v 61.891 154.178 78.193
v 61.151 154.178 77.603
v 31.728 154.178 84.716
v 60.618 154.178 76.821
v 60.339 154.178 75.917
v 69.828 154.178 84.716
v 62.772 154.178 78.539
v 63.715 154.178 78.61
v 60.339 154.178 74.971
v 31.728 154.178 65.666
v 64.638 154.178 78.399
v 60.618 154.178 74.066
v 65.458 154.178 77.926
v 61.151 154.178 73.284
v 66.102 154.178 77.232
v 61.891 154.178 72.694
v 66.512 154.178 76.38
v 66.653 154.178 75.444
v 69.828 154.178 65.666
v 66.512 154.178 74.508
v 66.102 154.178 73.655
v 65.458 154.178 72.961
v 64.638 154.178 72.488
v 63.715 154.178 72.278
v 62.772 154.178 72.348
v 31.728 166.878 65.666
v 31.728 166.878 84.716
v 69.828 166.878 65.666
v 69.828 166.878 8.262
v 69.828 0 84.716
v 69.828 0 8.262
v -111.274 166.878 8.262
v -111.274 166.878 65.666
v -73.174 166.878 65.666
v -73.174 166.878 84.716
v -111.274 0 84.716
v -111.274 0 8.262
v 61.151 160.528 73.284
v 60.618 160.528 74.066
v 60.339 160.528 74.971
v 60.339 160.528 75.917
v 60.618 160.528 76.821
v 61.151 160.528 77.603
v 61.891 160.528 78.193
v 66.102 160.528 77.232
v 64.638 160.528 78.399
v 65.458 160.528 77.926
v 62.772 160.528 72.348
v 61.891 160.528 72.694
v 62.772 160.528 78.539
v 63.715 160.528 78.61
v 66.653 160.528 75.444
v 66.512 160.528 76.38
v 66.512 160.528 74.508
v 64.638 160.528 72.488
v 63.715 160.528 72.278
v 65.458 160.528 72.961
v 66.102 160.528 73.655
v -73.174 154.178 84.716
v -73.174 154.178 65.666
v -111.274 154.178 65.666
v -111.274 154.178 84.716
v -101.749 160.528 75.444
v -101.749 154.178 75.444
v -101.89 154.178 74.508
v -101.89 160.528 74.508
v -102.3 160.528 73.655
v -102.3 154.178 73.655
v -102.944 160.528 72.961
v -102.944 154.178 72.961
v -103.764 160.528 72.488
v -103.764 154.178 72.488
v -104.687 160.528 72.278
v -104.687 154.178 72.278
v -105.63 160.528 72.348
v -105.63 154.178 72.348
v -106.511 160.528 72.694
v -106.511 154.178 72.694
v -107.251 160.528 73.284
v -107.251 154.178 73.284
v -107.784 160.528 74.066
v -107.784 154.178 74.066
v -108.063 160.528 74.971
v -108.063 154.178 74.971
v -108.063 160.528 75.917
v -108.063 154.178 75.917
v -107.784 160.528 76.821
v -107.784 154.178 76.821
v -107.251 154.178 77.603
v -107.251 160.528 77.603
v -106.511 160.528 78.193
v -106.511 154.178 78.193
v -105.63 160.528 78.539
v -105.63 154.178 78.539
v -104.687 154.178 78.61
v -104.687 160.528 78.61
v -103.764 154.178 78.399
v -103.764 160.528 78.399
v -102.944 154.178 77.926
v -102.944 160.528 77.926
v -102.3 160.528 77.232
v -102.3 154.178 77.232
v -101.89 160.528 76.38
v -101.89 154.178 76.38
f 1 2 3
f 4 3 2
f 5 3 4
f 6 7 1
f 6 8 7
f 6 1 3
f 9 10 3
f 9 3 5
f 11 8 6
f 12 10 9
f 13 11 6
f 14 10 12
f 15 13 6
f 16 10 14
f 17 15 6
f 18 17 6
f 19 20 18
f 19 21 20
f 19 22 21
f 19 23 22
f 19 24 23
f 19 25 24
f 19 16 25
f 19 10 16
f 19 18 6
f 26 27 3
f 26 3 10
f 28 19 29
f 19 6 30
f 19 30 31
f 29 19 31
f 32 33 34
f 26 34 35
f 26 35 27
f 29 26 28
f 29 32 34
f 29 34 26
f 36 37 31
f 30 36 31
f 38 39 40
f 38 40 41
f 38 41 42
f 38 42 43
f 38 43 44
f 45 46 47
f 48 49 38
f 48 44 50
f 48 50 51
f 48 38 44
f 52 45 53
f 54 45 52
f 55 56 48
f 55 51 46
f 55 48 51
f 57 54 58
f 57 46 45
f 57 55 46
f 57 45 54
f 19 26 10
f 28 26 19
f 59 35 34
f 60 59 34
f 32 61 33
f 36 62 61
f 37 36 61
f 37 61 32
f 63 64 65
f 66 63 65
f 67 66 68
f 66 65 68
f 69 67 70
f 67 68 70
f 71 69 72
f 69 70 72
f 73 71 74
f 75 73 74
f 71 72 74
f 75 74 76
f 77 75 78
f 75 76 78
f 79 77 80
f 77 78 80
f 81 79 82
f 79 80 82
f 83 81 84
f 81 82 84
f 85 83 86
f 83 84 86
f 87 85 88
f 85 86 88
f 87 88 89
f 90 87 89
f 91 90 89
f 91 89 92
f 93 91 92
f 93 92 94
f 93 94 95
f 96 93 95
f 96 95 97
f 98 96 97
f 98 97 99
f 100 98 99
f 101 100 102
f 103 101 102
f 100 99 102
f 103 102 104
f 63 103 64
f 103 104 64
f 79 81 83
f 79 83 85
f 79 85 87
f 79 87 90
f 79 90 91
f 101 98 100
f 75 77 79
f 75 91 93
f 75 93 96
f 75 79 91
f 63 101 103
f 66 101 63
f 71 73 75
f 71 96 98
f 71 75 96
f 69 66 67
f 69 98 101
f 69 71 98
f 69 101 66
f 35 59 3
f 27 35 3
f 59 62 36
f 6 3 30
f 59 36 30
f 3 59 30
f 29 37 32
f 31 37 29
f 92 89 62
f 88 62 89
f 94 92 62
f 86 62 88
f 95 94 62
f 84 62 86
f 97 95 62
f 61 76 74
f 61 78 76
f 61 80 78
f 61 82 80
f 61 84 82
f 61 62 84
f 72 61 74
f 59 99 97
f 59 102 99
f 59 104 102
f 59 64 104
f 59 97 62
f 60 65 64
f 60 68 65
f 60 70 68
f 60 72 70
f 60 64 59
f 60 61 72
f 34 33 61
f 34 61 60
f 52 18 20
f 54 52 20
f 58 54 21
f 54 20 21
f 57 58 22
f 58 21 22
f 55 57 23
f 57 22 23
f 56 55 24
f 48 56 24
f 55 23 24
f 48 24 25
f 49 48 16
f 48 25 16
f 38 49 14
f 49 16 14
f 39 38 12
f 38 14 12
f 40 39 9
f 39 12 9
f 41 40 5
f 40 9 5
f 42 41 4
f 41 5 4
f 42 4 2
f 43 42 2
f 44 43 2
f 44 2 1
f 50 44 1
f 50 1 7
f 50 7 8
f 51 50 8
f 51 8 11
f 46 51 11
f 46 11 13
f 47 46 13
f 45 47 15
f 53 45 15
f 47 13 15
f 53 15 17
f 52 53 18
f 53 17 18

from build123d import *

# Parameters (mm, degrees)
SKETCH1_W           = 181.102
SKETCH1_H           = 76.454
BOSS_EXTRUDE1_DEPTH = 166.878
SKETCH2_W           = 38.1
SKETCH2_H           = 19.05
CUT_EXTRUDE1_DEPTH  = 12.7
SKETCH3_R           = 3.175
BOSS_EXTRUDE2_DEPTH = 6.35


with BuildPart() as part:
    # Sketch1 → Boss-Extrude1 (new body)
    with BuildSketch(Plane(origin=(0, 0, 0), x_dir=(1, 0, 0), z_dir=(0, 1, 0))):
        with Locations((-20.72278737, -46.488845277)):
            Rectangle(SKETCH1_W, SKETCH1_H)
    extrude(amount=BOSS_EXTRUDE1_DEPTH)

    # Sketch2 → Cut-Extrude1 (cut)
    with BuildSketch(Plane(origin=(0, 166.878, 0), x_dir=(1, 0, 0), z_dir=(0, 1, 0))):
        with Locations((-92.22378737, -75.190845277)):
            Rectangle(SKETCH2_W, SKETCH2_H)
        with Locations((50.77821263, -75.190845277)):
            Rectangle(SKETCH2_W, SKETCH2_H)
    extrude(amount=-CUT_EXTRUDE1_DEPTH, mode=Mode.SUBTRACT)

    # Sketch3 → Boss-Extrude2 (add)
    with BuildSketch(Plane(origin=(0, 154.178, 0), x_dir=(1, 0, 0), z_dir=(0, 1, 0))):
        with Locations((63.47821263, -75.443767272)):
            Circle(SKETCH3_R)
        with Locations((-104.92378737, -75.443767272)):
            Circle(SKETCH3_R)
    extrude(amount=BOSS_EXTRUDE2_DEPTH)


solid = part.part
